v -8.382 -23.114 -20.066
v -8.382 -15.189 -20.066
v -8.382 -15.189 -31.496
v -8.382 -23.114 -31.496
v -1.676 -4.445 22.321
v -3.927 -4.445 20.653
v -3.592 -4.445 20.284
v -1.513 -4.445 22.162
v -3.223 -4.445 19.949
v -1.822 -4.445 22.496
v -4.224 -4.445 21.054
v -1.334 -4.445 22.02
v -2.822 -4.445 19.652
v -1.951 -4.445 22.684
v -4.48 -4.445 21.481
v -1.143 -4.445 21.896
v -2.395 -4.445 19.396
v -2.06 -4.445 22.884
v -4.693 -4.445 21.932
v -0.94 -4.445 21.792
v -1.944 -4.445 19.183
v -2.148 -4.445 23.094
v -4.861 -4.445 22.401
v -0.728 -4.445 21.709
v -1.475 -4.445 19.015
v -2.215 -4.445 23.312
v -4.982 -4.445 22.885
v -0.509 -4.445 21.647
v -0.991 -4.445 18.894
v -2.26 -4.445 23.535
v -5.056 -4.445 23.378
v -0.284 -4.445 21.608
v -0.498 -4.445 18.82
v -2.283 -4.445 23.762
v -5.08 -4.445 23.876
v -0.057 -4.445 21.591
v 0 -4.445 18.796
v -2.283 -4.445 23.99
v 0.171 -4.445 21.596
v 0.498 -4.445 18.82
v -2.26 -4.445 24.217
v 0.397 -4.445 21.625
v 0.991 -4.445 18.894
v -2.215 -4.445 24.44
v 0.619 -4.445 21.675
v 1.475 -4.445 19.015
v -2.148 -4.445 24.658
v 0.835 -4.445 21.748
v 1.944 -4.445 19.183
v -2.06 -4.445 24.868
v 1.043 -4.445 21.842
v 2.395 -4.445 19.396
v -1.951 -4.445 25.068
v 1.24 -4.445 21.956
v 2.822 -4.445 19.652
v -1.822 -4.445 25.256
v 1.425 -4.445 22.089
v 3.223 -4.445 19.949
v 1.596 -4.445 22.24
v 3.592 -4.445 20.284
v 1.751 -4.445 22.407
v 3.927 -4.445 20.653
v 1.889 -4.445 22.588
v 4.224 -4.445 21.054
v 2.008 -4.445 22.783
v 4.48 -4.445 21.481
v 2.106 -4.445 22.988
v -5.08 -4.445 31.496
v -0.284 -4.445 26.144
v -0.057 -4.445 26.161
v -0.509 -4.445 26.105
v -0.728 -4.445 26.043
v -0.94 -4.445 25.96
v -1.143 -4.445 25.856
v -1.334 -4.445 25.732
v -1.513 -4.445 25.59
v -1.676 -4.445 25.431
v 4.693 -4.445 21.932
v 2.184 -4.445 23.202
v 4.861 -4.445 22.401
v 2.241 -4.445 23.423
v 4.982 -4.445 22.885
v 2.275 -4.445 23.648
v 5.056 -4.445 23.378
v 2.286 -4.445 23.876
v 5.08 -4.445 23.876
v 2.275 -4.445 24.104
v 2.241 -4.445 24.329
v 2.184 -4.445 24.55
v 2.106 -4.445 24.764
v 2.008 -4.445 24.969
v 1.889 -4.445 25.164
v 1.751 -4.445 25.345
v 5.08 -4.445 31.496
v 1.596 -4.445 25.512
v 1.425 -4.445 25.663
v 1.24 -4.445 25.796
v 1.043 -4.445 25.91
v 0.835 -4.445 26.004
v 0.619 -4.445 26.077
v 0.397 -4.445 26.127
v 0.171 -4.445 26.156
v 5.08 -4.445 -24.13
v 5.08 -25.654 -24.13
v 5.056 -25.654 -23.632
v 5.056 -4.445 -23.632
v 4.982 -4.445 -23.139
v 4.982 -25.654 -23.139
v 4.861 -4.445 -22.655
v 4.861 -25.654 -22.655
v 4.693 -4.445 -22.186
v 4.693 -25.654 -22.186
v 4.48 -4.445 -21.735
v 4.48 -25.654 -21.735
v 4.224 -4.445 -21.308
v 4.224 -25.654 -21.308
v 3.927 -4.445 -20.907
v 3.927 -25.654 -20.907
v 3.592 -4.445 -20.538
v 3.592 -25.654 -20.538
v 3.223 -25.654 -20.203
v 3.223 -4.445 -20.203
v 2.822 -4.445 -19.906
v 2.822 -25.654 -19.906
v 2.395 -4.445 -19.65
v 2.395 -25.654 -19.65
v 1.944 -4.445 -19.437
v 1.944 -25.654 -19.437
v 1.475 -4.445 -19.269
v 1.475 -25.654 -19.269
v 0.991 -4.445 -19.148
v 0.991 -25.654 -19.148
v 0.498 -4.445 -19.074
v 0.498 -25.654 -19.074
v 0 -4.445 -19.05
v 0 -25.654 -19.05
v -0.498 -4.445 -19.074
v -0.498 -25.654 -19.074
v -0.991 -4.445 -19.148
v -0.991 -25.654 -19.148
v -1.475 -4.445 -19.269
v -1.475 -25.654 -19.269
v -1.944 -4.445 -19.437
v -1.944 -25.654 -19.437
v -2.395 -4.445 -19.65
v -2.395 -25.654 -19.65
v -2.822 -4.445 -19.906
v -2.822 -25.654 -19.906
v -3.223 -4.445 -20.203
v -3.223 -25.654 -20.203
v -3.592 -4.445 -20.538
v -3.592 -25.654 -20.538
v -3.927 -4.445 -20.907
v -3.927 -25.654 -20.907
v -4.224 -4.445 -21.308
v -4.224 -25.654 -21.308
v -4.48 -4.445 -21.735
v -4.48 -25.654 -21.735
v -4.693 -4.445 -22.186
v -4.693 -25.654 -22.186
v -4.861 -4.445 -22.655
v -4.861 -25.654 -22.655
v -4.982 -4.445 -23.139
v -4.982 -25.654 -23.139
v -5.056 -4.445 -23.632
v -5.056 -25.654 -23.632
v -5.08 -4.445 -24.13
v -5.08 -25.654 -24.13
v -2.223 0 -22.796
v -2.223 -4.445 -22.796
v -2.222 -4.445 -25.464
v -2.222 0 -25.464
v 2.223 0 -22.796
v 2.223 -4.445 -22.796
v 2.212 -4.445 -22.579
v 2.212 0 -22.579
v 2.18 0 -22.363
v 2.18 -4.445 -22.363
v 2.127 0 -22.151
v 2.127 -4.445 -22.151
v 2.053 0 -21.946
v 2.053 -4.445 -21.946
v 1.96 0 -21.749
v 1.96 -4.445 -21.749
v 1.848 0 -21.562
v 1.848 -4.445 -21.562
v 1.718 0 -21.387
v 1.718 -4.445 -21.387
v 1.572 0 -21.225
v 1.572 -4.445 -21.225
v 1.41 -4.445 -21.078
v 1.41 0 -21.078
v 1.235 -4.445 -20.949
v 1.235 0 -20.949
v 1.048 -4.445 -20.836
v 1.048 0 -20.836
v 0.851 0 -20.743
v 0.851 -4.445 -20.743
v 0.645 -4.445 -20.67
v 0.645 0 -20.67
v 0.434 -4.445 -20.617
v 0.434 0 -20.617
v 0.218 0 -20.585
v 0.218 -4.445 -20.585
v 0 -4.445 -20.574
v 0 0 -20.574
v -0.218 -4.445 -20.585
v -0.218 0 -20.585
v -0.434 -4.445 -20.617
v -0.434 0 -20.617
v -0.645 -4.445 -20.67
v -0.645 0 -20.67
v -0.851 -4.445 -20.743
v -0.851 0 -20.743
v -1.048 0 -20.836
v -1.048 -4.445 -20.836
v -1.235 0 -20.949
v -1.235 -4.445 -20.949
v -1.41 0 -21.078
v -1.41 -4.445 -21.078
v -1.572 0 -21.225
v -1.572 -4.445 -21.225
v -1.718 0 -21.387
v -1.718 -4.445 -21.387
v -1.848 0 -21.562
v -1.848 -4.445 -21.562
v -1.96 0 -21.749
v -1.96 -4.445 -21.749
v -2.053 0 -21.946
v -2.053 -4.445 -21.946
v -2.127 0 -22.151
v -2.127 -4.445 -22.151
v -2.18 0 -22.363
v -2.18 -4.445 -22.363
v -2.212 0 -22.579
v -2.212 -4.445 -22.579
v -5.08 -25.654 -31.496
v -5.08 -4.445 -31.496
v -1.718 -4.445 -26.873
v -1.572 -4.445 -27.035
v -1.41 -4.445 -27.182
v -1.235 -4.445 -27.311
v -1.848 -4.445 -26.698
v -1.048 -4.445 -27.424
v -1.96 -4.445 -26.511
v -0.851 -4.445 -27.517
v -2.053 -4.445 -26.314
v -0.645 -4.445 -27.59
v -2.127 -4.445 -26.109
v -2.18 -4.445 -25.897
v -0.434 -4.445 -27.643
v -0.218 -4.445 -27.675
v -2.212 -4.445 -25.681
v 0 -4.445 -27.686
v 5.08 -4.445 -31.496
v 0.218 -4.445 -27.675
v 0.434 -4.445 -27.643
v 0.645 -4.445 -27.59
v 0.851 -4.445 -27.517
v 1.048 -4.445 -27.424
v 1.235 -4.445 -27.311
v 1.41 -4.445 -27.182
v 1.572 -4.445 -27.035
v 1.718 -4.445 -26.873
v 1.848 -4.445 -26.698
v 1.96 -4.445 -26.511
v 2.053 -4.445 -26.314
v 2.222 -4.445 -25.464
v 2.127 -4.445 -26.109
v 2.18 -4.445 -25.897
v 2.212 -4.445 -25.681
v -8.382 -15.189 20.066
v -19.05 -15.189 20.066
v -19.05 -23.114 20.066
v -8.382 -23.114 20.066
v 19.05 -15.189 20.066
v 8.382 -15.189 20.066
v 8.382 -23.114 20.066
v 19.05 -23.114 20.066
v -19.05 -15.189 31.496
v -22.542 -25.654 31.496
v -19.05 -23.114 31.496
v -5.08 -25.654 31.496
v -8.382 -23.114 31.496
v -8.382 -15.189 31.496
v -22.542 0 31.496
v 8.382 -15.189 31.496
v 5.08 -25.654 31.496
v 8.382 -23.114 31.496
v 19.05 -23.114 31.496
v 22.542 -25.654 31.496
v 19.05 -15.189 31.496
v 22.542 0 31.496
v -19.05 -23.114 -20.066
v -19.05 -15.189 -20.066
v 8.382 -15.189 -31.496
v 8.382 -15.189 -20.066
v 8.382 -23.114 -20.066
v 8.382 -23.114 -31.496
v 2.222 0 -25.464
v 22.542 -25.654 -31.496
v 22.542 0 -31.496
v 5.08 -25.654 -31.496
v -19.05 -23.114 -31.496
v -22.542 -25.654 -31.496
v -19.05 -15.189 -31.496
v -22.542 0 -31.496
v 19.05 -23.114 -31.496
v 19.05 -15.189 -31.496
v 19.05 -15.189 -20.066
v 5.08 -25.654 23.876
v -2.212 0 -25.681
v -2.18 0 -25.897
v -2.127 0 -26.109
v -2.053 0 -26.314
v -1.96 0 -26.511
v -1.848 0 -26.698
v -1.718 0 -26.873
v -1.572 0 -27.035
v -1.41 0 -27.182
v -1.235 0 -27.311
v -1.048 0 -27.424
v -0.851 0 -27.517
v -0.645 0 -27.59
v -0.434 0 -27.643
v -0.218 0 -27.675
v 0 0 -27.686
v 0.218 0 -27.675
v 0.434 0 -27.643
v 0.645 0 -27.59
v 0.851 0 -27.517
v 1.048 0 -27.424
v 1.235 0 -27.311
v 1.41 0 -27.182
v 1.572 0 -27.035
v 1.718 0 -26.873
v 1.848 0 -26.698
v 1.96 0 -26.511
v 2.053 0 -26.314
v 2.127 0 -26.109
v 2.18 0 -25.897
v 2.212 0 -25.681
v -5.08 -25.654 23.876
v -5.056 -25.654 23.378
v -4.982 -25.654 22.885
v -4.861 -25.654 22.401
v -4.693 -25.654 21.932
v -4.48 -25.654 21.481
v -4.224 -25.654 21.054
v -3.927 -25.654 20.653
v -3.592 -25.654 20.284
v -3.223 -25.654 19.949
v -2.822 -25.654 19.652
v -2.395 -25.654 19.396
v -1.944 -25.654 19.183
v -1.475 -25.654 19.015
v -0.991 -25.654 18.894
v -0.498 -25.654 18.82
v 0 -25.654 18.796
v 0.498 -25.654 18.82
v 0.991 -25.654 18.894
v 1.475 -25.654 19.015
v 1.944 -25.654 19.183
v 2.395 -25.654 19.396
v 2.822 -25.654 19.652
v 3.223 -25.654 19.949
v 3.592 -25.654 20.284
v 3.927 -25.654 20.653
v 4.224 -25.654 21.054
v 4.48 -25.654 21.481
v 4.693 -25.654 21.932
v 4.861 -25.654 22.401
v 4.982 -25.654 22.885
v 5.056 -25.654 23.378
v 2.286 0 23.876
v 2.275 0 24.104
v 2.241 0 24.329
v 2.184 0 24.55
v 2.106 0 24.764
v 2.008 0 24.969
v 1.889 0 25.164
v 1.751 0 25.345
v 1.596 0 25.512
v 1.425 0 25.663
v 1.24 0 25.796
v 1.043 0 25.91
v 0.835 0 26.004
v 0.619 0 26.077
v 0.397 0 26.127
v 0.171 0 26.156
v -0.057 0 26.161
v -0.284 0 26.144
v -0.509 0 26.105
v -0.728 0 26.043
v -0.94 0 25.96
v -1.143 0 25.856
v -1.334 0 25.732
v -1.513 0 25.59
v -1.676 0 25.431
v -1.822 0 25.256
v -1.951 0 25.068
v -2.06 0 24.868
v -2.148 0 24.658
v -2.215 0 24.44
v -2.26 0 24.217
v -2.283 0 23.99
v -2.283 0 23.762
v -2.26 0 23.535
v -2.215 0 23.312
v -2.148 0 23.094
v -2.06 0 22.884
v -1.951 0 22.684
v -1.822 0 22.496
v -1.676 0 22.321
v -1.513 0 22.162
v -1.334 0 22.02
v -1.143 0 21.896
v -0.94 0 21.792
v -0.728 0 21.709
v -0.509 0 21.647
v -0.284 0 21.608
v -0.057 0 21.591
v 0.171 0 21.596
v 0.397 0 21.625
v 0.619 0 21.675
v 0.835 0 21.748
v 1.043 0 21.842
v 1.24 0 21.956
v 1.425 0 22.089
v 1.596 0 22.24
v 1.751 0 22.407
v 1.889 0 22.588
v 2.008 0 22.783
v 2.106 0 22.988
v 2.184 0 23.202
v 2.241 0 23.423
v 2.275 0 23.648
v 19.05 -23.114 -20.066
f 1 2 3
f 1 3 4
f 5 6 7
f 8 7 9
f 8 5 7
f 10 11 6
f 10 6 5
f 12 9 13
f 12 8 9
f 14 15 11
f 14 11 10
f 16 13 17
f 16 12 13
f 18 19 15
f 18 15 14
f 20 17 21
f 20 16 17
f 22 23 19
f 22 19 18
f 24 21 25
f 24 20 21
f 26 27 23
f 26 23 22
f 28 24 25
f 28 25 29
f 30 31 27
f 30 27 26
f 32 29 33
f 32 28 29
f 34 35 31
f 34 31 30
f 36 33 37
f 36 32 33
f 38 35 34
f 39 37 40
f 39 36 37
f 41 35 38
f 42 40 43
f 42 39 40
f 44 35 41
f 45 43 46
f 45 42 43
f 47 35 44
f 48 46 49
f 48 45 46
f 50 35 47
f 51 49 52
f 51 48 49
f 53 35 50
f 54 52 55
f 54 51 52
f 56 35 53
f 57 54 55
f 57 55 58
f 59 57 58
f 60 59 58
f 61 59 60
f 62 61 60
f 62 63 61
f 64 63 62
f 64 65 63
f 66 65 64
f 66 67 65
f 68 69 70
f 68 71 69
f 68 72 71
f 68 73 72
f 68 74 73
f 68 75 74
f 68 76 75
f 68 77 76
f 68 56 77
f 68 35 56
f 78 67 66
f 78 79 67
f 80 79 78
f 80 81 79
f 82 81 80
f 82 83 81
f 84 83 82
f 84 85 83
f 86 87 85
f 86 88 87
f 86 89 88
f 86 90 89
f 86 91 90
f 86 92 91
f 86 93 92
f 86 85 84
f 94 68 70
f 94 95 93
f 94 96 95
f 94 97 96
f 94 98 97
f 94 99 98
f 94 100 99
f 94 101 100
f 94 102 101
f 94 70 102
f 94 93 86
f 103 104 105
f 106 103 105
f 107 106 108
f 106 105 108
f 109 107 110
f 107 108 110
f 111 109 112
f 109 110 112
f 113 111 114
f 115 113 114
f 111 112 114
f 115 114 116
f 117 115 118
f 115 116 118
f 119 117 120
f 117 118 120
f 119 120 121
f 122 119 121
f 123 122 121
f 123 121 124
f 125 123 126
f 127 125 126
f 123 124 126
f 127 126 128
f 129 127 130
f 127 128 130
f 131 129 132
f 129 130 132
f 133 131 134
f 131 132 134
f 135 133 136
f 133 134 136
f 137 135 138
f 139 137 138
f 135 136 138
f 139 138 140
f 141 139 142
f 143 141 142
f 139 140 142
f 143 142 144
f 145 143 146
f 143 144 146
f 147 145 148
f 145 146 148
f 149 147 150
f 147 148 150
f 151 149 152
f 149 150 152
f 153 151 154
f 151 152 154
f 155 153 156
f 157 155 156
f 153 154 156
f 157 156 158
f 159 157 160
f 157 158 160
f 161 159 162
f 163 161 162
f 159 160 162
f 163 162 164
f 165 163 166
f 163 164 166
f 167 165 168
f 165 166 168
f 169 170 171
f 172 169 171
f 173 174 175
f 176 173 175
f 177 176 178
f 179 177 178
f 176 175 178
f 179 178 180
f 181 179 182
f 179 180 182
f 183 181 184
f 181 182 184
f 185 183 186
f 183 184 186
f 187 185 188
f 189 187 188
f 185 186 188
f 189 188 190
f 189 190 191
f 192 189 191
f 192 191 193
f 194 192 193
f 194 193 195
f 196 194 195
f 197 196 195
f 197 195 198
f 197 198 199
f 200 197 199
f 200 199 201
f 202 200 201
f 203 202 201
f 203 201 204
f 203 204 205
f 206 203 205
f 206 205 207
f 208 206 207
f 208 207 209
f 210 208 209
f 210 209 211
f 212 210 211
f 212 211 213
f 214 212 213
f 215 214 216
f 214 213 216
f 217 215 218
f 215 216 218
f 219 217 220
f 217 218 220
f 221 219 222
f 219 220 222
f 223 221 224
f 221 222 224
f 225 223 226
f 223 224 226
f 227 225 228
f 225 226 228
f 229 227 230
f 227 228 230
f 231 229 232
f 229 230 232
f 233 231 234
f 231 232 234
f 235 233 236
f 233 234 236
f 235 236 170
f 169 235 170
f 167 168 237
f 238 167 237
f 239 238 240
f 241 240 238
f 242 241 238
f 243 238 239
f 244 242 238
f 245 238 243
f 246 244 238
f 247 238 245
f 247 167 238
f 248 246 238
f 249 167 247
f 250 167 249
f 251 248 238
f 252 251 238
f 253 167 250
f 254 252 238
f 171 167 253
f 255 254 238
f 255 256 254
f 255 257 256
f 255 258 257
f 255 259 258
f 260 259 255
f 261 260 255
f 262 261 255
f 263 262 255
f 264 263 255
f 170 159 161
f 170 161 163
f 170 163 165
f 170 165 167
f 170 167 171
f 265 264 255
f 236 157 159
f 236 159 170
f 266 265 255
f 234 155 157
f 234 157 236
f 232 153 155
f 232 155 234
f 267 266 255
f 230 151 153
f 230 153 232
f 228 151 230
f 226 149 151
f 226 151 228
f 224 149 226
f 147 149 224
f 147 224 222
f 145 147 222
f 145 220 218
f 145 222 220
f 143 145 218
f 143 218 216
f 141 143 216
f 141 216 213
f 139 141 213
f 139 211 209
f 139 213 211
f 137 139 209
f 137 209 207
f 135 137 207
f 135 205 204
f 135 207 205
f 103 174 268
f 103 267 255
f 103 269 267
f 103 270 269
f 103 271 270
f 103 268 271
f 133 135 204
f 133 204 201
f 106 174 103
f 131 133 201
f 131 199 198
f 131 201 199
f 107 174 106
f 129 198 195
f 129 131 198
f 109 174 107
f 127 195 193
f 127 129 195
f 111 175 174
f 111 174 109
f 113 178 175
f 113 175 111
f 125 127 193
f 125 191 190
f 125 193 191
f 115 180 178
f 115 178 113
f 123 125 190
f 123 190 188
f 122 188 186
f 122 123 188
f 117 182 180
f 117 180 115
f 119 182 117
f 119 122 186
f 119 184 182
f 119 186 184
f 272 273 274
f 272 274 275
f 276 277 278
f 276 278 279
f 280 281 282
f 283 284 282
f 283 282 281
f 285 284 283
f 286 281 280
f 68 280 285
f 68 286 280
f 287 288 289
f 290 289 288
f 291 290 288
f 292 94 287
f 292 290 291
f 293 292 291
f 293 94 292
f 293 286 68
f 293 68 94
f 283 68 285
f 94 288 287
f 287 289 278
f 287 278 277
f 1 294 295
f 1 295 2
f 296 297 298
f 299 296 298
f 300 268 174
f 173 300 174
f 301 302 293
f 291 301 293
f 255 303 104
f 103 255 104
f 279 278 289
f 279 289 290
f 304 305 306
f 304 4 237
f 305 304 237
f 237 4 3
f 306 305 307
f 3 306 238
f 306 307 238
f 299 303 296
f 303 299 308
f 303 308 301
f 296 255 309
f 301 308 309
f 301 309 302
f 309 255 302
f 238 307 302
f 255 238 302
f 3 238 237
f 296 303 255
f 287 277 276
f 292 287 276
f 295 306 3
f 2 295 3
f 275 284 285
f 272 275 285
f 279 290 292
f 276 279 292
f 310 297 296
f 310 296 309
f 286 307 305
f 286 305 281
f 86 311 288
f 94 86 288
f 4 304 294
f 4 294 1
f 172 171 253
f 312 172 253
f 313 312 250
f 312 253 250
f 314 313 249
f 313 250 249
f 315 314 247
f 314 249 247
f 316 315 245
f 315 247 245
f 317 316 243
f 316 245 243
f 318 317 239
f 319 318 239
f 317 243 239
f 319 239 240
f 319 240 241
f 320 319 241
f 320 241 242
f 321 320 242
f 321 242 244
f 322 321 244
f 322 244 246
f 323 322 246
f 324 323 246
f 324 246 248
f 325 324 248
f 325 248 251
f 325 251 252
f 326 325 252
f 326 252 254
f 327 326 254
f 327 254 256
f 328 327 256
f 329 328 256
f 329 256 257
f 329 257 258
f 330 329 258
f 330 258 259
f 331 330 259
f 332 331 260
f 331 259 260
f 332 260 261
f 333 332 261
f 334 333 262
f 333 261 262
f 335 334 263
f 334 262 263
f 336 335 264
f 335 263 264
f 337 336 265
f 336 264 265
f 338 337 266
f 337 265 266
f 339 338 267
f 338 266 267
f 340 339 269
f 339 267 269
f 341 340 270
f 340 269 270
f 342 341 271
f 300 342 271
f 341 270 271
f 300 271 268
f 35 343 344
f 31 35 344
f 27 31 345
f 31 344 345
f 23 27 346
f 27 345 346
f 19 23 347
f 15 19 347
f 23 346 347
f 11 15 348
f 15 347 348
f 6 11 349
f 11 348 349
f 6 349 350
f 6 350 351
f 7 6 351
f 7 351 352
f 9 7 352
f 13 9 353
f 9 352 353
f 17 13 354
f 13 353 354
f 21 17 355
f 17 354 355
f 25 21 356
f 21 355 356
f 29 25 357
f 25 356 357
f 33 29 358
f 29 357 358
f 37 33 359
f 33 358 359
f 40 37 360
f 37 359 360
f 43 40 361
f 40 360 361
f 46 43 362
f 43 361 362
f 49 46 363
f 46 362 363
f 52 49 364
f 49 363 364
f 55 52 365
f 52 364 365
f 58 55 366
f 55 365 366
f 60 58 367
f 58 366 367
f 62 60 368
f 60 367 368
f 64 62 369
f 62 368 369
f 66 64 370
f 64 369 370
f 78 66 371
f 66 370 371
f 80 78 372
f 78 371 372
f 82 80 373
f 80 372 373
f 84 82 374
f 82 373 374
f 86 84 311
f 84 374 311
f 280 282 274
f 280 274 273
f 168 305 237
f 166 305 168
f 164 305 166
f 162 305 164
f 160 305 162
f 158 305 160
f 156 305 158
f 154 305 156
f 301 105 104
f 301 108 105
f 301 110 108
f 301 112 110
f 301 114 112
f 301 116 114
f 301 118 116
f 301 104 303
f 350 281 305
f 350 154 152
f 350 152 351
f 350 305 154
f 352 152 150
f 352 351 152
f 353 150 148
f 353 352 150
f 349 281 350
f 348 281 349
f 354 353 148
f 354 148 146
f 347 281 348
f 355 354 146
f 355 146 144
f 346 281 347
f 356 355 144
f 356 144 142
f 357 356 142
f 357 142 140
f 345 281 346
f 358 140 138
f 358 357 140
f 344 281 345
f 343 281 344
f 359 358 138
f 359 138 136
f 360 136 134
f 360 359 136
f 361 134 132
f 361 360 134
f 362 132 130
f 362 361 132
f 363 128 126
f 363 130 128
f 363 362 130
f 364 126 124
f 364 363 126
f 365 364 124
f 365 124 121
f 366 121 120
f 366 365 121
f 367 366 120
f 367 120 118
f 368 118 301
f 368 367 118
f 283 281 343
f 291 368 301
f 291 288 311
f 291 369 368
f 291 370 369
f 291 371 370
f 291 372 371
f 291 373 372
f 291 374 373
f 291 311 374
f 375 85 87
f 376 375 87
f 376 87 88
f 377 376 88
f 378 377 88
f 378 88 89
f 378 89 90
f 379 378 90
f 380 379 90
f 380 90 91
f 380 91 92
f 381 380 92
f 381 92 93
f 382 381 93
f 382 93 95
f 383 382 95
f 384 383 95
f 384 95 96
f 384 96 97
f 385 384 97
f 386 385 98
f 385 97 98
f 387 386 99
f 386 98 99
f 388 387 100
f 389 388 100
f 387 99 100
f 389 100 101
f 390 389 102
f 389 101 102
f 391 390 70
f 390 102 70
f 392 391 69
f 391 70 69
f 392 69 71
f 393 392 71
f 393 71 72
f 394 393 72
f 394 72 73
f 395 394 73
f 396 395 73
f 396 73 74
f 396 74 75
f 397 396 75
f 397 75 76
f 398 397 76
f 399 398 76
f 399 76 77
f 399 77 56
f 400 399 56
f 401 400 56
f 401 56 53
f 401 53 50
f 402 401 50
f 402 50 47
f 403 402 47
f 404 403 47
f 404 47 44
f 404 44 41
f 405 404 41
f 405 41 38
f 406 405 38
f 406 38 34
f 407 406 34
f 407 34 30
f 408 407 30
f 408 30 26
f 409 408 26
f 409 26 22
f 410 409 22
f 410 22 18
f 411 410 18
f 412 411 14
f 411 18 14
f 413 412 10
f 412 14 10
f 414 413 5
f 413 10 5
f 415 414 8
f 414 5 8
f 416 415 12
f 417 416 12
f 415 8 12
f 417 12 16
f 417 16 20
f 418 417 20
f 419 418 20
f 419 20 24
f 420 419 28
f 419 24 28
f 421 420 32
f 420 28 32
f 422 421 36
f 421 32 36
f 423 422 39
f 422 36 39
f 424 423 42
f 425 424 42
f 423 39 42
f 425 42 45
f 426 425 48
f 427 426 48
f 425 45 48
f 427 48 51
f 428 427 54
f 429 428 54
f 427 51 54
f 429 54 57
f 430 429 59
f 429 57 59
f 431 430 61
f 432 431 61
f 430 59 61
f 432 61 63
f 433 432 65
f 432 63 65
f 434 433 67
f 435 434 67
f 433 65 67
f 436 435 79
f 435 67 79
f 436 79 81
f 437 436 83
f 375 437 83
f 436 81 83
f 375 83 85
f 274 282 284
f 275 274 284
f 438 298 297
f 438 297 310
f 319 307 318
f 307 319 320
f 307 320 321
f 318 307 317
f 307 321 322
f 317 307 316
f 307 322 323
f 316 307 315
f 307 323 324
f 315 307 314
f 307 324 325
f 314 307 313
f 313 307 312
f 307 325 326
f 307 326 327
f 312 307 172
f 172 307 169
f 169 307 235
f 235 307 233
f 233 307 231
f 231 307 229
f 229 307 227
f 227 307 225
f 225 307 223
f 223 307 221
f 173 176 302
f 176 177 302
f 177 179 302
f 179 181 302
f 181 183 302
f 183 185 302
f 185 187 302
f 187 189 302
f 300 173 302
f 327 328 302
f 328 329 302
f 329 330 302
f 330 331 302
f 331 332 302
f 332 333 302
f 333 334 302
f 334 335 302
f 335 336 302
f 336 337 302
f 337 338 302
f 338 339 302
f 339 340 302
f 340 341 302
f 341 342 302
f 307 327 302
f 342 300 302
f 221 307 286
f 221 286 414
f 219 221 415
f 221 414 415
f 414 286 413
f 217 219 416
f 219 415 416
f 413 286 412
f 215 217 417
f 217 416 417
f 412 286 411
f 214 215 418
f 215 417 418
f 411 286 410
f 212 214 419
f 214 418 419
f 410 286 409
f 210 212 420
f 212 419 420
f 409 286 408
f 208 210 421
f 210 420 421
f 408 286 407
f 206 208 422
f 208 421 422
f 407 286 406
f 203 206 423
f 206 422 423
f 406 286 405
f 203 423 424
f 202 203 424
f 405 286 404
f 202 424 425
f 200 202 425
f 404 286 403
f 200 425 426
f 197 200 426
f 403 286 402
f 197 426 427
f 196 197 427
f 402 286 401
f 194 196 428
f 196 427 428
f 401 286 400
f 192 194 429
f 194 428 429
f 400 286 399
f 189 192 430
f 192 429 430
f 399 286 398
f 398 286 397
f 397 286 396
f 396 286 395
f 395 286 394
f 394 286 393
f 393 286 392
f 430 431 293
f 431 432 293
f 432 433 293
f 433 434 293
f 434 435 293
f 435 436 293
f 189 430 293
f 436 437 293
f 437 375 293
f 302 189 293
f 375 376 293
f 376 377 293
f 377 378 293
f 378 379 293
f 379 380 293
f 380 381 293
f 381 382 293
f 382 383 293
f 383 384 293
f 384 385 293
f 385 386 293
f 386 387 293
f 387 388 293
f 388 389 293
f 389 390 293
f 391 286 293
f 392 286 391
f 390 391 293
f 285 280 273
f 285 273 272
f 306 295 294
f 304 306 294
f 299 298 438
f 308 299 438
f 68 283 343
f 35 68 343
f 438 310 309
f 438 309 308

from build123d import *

# Parameters (mm, degrees)
F0_W     = 45.085
F0_H     = 62.992
F1_DEPTH = 25.654
F2_R     = 2.286
F3_DEPTH = 35.306
F5_DEPTH = 21.209
F6_W     = 10.668
F6_H     = 7.9248
F7_DEPTH = 11.43
F8_W     = 10.668
F8_H     = 7.9248
F9_DEPTH = 11.43


with BuildPart() as f1:
    # F0 (on Front) → F1 (new body)
    with BuildSketch(Plane.XZ):
        Rectangle(F0_W, F0_H)
    extrude(amount=F1_DEPTH)

    # F2 (on face) → F3 (cut)
    with BuildSketch(Plane.XZ.offset(25.654)):
        with Locations((0, 23.876)):
            Circle(F2_R)
        with BuildLine():
            Line((-2.2225, -22.7965), (-2.2225, -25.4635))
            ThreePointArc((-2.2225, -25.4635), (0, -27.686), (2.2225, -25.4635))
            Line((2.2225, -25.4635), (2.2225, -22.7965))
            ThreePointArc((2.2225, -22.7965), (0, -20.574), (-2.2225, -22.7965))
        make_face()
    extrude(amount=-F3_DEPTH, mode=Mode.SUBTRACT)

    # F4 (on face) → F5 (cut)
    with BuildSketch(Plane.XZ.offset(25.654)):
        with BuildLine():
            Line((-5.08, 34.951579), (-5.08, 23.876))
            ThreePointArc((-5.08, 23.876), (0, 18.796), (5.08, 23.876))
            Line((5.08, 23.876), (5.08, 34.951579))
            Line((5.08, 34.951579), (-5.08, 34.951579))
        make_face()
        with BuildLine():
            Line((5.08, -34.4517), (5.08, -24.13))
            ThreePointArc((5.08, -24.13), (0, -19.05), (-5.08, -24.13))
            Line((-5.08, -24.13), (-5.08, -34.4517))
            Line((-5.08, -34.4517), (5.08, -34.4517))
        make_face()
    extrude(amount=-F5_DEPTH, mode=Mode.SUBTRACT)

    # F6 (on face) → F7 (cut)
    with BuildSketch(Plane(origin=(0, 0, -31.496), x_dir=(1, 0, 0), z_dir=(0, 0, -1))):
        with Locations((-13.716, 19.1516)):
            Rectangle(F6_W, F6_H)
        with Locations((13.716, 19.1516)):
            Rectangle(F6_W, F6_H)
    extrude(amount=-F7_DEPTH, mode=Mode.SUBTRACT)

    # F8 (on face) → F9 (cut)
    with BuildSketch(Plane.XY.offset(31.496)):
        with Locations((13.716, -19.1516)):
            Rectangle(F8_W, F8_H)
        with Locations((-13.716, -19.1516)):
            Rectangle(F8_W, F8_H)
    extrude(amount=-F9_DEPTH, mode=Mode.SUBTRACT)


solid = f1.part
